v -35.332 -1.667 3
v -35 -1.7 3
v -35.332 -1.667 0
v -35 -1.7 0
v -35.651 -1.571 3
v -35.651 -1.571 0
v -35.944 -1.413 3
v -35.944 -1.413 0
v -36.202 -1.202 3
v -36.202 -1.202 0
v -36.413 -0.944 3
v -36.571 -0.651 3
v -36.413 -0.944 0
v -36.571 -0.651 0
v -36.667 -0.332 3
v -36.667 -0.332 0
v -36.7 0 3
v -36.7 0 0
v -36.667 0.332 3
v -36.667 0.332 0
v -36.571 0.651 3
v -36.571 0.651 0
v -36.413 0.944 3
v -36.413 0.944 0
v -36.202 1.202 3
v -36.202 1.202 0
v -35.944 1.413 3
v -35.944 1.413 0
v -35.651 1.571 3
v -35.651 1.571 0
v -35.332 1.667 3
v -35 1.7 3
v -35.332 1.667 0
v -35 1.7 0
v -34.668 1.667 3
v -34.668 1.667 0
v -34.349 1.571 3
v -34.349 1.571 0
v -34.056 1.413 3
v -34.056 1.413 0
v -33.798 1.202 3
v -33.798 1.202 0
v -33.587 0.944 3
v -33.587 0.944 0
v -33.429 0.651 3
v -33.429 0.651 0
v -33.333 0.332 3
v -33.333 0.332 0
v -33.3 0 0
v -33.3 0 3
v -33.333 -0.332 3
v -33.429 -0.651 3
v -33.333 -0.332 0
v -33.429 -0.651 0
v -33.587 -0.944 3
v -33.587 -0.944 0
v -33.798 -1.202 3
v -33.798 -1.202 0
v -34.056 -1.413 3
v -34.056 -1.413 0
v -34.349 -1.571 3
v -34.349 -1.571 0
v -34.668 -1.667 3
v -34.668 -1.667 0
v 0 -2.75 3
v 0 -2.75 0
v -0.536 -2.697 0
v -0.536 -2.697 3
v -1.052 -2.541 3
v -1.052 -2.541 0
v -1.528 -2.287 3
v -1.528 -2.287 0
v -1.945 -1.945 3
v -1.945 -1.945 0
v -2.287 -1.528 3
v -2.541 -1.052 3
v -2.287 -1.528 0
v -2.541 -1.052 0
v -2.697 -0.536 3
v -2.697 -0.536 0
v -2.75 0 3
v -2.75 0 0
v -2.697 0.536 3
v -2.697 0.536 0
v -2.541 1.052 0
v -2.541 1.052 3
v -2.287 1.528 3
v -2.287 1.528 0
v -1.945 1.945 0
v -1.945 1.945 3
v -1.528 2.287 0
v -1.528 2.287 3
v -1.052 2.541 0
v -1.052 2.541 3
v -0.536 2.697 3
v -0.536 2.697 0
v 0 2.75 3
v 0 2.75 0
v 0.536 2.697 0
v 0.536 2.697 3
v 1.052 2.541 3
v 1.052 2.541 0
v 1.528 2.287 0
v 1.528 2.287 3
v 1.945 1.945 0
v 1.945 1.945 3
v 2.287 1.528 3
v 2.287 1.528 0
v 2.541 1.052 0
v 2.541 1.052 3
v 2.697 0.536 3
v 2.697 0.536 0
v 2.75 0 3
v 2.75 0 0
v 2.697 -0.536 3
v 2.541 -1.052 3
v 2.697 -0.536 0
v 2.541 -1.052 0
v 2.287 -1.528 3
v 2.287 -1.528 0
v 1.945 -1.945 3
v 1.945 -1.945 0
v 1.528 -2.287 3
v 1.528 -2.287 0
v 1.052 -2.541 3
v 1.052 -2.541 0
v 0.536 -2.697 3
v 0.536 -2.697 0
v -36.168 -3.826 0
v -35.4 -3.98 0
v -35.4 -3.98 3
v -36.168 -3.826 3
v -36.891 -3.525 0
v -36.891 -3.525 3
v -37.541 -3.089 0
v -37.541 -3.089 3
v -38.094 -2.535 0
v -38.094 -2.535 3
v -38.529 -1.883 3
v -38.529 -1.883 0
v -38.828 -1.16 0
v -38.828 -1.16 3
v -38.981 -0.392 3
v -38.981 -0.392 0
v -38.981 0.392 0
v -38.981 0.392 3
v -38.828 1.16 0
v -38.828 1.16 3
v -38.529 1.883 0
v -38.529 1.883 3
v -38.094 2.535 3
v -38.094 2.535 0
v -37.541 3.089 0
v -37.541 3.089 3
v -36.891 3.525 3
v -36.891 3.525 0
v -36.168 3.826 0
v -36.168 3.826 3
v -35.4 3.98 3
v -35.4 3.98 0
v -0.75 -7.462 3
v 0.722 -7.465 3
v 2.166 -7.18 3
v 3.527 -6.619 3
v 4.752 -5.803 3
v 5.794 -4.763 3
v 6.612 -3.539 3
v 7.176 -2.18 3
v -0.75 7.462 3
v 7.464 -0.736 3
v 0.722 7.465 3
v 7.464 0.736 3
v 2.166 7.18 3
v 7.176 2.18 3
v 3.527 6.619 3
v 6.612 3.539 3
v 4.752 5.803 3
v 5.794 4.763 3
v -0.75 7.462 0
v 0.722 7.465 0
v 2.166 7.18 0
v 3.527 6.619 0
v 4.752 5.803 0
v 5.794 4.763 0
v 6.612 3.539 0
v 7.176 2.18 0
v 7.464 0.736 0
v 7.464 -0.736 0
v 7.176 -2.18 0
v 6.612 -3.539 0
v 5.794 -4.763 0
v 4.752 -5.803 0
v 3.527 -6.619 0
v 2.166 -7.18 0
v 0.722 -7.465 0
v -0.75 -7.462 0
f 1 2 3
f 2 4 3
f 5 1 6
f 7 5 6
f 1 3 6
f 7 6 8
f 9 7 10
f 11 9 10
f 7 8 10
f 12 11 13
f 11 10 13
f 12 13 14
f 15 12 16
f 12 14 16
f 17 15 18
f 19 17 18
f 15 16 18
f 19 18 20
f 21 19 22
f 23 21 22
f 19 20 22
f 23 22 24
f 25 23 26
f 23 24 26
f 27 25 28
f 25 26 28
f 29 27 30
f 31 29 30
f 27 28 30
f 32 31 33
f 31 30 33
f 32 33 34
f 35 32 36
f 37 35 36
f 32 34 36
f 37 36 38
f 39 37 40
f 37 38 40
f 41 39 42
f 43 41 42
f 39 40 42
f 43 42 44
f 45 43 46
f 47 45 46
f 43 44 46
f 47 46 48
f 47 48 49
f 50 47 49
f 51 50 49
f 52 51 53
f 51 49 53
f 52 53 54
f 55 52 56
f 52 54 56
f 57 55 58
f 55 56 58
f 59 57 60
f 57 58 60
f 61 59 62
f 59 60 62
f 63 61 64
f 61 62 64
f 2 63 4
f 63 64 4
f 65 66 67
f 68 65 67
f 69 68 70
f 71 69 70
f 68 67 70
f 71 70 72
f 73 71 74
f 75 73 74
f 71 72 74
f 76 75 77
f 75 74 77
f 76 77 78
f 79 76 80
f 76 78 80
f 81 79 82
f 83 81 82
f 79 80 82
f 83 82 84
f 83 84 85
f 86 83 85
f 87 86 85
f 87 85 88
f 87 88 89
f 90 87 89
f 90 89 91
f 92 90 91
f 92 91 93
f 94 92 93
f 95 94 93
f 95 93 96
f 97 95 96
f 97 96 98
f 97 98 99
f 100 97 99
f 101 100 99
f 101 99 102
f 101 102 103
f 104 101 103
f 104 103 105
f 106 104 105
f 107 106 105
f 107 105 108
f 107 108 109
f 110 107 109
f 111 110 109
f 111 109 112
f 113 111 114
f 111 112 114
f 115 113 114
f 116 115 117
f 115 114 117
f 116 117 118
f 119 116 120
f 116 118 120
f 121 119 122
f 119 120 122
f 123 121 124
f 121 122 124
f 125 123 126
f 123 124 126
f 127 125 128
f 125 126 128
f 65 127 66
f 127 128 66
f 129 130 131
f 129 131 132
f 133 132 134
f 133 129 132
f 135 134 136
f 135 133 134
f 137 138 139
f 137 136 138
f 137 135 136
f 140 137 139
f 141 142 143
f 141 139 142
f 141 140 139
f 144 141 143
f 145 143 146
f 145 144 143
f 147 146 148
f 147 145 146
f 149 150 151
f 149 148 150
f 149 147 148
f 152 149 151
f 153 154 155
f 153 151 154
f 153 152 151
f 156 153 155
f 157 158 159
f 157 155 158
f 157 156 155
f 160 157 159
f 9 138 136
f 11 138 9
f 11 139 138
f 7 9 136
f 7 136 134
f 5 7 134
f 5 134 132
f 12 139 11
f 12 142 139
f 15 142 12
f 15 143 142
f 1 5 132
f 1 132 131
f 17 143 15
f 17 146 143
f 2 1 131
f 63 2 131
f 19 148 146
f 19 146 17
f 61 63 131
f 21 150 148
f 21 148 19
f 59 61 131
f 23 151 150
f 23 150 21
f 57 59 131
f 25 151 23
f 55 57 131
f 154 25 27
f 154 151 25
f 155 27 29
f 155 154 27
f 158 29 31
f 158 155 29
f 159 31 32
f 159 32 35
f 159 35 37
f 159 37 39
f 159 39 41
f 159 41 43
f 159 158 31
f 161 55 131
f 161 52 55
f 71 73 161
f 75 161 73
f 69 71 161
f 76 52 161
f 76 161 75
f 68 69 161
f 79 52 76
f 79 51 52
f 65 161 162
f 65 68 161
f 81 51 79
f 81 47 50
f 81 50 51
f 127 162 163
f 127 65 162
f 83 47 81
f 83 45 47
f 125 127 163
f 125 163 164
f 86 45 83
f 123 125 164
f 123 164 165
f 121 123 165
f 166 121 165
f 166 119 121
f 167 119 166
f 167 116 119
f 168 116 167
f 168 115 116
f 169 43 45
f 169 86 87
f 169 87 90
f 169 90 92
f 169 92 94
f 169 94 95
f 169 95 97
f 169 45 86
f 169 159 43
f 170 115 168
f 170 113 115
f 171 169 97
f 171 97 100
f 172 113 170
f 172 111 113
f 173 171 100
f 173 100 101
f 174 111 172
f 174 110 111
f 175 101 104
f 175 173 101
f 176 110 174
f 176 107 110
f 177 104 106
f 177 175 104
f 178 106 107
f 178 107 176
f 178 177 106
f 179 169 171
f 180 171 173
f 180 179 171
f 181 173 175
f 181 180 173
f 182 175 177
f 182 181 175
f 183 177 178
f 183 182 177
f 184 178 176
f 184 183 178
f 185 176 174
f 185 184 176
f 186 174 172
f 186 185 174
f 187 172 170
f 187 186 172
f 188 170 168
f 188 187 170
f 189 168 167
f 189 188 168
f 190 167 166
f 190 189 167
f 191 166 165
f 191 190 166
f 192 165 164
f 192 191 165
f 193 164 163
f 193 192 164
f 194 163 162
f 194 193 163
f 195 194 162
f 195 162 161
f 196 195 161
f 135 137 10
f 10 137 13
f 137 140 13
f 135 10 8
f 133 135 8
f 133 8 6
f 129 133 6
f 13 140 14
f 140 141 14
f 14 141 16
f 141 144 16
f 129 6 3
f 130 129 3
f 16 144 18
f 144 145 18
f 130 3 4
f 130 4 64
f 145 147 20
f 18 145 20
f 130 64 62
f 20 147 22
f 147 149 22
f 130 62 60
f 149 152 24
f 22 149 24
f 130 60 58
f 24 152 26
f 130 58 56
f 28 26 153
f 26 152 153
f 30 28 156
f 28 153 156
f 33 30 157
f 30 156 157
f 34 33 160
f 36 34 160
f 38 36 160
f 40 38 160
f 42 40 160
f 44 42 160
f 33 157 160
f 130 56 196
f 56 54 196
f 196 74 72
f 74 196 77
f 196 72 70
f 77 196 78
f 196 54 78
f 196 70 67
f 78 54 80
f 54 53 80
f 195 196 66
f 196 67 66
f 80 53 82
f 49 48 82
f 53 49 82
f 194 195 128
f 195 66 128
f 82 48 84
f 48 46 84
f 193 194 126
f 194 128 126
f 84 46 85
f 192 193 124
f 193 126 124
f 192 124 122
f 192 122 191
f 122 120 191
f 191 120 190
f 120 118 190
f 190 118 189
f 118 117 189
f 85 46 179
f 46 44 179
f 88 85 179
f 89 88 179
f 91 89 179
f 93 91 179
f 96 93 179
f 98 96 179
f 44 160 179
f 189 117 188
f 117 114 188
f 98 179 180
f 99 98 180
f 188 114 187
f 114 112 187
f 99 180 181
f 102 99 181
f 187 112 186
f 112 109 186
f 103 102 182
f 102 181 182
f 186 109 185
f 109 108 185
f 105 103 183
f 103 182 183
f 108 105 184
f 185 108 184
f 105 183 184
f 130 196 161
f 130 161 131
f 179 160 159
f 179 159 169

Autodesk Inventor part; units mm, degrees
ref_plane "YZ Plane" through (0, 0, 0) normal (1, 0, 0) x (0, 1, 0)
ref_plane "XZ Plane" through (0, 0, 0) normal (0, 1, 0) x (-1, 0, 0)
ref_plane "XY Plane" through (0, 0, 0) normal (0, 0, 1) x (1, 0, 0)
sketch "Sketch1" plane through (0, 0, 0) normal (0, 0, 1) x (1, 0, 0)
  circle A0 centre (0, 0) radius 7.5
  circle A1 centre (-35, 0) radius 4
  line L0 (-35.4, 3.9799) -> (-0.75, 7.4624)
  line L1 (-0.75, -7.4624) -> (-35.4, -3.9799)
  dimension "d0" = 15
  dimension "d1" = 8
  dimension "d2" = 35
extrude "Extrusion1" add sketch "Sketch1" along normal blind 3
sketch "Sketch3" plane through (0, 0, 3) normal (0, 0, 1) x (1, 0, 0)
  arc A0 (-35.4, 3.9799) -> (-35.4, -3.9799) centre (-35, 0) ccw projected
  line L0 (-35.4, -3.9799) -> (-0.75, -7.4624) projected
  arc A1 (-0.75, -7.4624) -> (-0.75, 7.4624) centre (0, 0) ccw projected
  line L1 (-0.75, 7.4624) -> (-35.4, 3.9799) projected
hole "Hole1" at (0, 0, 3) direction (0, 0, -1) diameter 5.5 end through all
sketch "Sketch4" plane through (0, 0, 3) normal (0, 0, 1) x (1, 0, 0)
  circle A0 centre (0, 0) radius 2.75 projected
  arc A1 (-35.4, 3.9799) -> (-35.4, -3.9799) centre (-35, 0) ccw projected
  line L0 (-35.4, -3.9799) -> (-0.75, -7.4624) projected
  arc A2 (-0.75, -7.4624) -> (-0.75, 7.4624) centre (0, 0) ccw projected
  line L1 (-0.75, 7.4624) -> (-35.4, 3.9799) projected
hole "Hole2" at (-35, 0, 3) direction (0, 0, -1) diameter 3.4 end through all clearance for "Socket Head Cap Screw" size "M3" standard "Ansi Metric M Profile"
properties part number "Selection_Counterweight" material "Nylon 6/6"
